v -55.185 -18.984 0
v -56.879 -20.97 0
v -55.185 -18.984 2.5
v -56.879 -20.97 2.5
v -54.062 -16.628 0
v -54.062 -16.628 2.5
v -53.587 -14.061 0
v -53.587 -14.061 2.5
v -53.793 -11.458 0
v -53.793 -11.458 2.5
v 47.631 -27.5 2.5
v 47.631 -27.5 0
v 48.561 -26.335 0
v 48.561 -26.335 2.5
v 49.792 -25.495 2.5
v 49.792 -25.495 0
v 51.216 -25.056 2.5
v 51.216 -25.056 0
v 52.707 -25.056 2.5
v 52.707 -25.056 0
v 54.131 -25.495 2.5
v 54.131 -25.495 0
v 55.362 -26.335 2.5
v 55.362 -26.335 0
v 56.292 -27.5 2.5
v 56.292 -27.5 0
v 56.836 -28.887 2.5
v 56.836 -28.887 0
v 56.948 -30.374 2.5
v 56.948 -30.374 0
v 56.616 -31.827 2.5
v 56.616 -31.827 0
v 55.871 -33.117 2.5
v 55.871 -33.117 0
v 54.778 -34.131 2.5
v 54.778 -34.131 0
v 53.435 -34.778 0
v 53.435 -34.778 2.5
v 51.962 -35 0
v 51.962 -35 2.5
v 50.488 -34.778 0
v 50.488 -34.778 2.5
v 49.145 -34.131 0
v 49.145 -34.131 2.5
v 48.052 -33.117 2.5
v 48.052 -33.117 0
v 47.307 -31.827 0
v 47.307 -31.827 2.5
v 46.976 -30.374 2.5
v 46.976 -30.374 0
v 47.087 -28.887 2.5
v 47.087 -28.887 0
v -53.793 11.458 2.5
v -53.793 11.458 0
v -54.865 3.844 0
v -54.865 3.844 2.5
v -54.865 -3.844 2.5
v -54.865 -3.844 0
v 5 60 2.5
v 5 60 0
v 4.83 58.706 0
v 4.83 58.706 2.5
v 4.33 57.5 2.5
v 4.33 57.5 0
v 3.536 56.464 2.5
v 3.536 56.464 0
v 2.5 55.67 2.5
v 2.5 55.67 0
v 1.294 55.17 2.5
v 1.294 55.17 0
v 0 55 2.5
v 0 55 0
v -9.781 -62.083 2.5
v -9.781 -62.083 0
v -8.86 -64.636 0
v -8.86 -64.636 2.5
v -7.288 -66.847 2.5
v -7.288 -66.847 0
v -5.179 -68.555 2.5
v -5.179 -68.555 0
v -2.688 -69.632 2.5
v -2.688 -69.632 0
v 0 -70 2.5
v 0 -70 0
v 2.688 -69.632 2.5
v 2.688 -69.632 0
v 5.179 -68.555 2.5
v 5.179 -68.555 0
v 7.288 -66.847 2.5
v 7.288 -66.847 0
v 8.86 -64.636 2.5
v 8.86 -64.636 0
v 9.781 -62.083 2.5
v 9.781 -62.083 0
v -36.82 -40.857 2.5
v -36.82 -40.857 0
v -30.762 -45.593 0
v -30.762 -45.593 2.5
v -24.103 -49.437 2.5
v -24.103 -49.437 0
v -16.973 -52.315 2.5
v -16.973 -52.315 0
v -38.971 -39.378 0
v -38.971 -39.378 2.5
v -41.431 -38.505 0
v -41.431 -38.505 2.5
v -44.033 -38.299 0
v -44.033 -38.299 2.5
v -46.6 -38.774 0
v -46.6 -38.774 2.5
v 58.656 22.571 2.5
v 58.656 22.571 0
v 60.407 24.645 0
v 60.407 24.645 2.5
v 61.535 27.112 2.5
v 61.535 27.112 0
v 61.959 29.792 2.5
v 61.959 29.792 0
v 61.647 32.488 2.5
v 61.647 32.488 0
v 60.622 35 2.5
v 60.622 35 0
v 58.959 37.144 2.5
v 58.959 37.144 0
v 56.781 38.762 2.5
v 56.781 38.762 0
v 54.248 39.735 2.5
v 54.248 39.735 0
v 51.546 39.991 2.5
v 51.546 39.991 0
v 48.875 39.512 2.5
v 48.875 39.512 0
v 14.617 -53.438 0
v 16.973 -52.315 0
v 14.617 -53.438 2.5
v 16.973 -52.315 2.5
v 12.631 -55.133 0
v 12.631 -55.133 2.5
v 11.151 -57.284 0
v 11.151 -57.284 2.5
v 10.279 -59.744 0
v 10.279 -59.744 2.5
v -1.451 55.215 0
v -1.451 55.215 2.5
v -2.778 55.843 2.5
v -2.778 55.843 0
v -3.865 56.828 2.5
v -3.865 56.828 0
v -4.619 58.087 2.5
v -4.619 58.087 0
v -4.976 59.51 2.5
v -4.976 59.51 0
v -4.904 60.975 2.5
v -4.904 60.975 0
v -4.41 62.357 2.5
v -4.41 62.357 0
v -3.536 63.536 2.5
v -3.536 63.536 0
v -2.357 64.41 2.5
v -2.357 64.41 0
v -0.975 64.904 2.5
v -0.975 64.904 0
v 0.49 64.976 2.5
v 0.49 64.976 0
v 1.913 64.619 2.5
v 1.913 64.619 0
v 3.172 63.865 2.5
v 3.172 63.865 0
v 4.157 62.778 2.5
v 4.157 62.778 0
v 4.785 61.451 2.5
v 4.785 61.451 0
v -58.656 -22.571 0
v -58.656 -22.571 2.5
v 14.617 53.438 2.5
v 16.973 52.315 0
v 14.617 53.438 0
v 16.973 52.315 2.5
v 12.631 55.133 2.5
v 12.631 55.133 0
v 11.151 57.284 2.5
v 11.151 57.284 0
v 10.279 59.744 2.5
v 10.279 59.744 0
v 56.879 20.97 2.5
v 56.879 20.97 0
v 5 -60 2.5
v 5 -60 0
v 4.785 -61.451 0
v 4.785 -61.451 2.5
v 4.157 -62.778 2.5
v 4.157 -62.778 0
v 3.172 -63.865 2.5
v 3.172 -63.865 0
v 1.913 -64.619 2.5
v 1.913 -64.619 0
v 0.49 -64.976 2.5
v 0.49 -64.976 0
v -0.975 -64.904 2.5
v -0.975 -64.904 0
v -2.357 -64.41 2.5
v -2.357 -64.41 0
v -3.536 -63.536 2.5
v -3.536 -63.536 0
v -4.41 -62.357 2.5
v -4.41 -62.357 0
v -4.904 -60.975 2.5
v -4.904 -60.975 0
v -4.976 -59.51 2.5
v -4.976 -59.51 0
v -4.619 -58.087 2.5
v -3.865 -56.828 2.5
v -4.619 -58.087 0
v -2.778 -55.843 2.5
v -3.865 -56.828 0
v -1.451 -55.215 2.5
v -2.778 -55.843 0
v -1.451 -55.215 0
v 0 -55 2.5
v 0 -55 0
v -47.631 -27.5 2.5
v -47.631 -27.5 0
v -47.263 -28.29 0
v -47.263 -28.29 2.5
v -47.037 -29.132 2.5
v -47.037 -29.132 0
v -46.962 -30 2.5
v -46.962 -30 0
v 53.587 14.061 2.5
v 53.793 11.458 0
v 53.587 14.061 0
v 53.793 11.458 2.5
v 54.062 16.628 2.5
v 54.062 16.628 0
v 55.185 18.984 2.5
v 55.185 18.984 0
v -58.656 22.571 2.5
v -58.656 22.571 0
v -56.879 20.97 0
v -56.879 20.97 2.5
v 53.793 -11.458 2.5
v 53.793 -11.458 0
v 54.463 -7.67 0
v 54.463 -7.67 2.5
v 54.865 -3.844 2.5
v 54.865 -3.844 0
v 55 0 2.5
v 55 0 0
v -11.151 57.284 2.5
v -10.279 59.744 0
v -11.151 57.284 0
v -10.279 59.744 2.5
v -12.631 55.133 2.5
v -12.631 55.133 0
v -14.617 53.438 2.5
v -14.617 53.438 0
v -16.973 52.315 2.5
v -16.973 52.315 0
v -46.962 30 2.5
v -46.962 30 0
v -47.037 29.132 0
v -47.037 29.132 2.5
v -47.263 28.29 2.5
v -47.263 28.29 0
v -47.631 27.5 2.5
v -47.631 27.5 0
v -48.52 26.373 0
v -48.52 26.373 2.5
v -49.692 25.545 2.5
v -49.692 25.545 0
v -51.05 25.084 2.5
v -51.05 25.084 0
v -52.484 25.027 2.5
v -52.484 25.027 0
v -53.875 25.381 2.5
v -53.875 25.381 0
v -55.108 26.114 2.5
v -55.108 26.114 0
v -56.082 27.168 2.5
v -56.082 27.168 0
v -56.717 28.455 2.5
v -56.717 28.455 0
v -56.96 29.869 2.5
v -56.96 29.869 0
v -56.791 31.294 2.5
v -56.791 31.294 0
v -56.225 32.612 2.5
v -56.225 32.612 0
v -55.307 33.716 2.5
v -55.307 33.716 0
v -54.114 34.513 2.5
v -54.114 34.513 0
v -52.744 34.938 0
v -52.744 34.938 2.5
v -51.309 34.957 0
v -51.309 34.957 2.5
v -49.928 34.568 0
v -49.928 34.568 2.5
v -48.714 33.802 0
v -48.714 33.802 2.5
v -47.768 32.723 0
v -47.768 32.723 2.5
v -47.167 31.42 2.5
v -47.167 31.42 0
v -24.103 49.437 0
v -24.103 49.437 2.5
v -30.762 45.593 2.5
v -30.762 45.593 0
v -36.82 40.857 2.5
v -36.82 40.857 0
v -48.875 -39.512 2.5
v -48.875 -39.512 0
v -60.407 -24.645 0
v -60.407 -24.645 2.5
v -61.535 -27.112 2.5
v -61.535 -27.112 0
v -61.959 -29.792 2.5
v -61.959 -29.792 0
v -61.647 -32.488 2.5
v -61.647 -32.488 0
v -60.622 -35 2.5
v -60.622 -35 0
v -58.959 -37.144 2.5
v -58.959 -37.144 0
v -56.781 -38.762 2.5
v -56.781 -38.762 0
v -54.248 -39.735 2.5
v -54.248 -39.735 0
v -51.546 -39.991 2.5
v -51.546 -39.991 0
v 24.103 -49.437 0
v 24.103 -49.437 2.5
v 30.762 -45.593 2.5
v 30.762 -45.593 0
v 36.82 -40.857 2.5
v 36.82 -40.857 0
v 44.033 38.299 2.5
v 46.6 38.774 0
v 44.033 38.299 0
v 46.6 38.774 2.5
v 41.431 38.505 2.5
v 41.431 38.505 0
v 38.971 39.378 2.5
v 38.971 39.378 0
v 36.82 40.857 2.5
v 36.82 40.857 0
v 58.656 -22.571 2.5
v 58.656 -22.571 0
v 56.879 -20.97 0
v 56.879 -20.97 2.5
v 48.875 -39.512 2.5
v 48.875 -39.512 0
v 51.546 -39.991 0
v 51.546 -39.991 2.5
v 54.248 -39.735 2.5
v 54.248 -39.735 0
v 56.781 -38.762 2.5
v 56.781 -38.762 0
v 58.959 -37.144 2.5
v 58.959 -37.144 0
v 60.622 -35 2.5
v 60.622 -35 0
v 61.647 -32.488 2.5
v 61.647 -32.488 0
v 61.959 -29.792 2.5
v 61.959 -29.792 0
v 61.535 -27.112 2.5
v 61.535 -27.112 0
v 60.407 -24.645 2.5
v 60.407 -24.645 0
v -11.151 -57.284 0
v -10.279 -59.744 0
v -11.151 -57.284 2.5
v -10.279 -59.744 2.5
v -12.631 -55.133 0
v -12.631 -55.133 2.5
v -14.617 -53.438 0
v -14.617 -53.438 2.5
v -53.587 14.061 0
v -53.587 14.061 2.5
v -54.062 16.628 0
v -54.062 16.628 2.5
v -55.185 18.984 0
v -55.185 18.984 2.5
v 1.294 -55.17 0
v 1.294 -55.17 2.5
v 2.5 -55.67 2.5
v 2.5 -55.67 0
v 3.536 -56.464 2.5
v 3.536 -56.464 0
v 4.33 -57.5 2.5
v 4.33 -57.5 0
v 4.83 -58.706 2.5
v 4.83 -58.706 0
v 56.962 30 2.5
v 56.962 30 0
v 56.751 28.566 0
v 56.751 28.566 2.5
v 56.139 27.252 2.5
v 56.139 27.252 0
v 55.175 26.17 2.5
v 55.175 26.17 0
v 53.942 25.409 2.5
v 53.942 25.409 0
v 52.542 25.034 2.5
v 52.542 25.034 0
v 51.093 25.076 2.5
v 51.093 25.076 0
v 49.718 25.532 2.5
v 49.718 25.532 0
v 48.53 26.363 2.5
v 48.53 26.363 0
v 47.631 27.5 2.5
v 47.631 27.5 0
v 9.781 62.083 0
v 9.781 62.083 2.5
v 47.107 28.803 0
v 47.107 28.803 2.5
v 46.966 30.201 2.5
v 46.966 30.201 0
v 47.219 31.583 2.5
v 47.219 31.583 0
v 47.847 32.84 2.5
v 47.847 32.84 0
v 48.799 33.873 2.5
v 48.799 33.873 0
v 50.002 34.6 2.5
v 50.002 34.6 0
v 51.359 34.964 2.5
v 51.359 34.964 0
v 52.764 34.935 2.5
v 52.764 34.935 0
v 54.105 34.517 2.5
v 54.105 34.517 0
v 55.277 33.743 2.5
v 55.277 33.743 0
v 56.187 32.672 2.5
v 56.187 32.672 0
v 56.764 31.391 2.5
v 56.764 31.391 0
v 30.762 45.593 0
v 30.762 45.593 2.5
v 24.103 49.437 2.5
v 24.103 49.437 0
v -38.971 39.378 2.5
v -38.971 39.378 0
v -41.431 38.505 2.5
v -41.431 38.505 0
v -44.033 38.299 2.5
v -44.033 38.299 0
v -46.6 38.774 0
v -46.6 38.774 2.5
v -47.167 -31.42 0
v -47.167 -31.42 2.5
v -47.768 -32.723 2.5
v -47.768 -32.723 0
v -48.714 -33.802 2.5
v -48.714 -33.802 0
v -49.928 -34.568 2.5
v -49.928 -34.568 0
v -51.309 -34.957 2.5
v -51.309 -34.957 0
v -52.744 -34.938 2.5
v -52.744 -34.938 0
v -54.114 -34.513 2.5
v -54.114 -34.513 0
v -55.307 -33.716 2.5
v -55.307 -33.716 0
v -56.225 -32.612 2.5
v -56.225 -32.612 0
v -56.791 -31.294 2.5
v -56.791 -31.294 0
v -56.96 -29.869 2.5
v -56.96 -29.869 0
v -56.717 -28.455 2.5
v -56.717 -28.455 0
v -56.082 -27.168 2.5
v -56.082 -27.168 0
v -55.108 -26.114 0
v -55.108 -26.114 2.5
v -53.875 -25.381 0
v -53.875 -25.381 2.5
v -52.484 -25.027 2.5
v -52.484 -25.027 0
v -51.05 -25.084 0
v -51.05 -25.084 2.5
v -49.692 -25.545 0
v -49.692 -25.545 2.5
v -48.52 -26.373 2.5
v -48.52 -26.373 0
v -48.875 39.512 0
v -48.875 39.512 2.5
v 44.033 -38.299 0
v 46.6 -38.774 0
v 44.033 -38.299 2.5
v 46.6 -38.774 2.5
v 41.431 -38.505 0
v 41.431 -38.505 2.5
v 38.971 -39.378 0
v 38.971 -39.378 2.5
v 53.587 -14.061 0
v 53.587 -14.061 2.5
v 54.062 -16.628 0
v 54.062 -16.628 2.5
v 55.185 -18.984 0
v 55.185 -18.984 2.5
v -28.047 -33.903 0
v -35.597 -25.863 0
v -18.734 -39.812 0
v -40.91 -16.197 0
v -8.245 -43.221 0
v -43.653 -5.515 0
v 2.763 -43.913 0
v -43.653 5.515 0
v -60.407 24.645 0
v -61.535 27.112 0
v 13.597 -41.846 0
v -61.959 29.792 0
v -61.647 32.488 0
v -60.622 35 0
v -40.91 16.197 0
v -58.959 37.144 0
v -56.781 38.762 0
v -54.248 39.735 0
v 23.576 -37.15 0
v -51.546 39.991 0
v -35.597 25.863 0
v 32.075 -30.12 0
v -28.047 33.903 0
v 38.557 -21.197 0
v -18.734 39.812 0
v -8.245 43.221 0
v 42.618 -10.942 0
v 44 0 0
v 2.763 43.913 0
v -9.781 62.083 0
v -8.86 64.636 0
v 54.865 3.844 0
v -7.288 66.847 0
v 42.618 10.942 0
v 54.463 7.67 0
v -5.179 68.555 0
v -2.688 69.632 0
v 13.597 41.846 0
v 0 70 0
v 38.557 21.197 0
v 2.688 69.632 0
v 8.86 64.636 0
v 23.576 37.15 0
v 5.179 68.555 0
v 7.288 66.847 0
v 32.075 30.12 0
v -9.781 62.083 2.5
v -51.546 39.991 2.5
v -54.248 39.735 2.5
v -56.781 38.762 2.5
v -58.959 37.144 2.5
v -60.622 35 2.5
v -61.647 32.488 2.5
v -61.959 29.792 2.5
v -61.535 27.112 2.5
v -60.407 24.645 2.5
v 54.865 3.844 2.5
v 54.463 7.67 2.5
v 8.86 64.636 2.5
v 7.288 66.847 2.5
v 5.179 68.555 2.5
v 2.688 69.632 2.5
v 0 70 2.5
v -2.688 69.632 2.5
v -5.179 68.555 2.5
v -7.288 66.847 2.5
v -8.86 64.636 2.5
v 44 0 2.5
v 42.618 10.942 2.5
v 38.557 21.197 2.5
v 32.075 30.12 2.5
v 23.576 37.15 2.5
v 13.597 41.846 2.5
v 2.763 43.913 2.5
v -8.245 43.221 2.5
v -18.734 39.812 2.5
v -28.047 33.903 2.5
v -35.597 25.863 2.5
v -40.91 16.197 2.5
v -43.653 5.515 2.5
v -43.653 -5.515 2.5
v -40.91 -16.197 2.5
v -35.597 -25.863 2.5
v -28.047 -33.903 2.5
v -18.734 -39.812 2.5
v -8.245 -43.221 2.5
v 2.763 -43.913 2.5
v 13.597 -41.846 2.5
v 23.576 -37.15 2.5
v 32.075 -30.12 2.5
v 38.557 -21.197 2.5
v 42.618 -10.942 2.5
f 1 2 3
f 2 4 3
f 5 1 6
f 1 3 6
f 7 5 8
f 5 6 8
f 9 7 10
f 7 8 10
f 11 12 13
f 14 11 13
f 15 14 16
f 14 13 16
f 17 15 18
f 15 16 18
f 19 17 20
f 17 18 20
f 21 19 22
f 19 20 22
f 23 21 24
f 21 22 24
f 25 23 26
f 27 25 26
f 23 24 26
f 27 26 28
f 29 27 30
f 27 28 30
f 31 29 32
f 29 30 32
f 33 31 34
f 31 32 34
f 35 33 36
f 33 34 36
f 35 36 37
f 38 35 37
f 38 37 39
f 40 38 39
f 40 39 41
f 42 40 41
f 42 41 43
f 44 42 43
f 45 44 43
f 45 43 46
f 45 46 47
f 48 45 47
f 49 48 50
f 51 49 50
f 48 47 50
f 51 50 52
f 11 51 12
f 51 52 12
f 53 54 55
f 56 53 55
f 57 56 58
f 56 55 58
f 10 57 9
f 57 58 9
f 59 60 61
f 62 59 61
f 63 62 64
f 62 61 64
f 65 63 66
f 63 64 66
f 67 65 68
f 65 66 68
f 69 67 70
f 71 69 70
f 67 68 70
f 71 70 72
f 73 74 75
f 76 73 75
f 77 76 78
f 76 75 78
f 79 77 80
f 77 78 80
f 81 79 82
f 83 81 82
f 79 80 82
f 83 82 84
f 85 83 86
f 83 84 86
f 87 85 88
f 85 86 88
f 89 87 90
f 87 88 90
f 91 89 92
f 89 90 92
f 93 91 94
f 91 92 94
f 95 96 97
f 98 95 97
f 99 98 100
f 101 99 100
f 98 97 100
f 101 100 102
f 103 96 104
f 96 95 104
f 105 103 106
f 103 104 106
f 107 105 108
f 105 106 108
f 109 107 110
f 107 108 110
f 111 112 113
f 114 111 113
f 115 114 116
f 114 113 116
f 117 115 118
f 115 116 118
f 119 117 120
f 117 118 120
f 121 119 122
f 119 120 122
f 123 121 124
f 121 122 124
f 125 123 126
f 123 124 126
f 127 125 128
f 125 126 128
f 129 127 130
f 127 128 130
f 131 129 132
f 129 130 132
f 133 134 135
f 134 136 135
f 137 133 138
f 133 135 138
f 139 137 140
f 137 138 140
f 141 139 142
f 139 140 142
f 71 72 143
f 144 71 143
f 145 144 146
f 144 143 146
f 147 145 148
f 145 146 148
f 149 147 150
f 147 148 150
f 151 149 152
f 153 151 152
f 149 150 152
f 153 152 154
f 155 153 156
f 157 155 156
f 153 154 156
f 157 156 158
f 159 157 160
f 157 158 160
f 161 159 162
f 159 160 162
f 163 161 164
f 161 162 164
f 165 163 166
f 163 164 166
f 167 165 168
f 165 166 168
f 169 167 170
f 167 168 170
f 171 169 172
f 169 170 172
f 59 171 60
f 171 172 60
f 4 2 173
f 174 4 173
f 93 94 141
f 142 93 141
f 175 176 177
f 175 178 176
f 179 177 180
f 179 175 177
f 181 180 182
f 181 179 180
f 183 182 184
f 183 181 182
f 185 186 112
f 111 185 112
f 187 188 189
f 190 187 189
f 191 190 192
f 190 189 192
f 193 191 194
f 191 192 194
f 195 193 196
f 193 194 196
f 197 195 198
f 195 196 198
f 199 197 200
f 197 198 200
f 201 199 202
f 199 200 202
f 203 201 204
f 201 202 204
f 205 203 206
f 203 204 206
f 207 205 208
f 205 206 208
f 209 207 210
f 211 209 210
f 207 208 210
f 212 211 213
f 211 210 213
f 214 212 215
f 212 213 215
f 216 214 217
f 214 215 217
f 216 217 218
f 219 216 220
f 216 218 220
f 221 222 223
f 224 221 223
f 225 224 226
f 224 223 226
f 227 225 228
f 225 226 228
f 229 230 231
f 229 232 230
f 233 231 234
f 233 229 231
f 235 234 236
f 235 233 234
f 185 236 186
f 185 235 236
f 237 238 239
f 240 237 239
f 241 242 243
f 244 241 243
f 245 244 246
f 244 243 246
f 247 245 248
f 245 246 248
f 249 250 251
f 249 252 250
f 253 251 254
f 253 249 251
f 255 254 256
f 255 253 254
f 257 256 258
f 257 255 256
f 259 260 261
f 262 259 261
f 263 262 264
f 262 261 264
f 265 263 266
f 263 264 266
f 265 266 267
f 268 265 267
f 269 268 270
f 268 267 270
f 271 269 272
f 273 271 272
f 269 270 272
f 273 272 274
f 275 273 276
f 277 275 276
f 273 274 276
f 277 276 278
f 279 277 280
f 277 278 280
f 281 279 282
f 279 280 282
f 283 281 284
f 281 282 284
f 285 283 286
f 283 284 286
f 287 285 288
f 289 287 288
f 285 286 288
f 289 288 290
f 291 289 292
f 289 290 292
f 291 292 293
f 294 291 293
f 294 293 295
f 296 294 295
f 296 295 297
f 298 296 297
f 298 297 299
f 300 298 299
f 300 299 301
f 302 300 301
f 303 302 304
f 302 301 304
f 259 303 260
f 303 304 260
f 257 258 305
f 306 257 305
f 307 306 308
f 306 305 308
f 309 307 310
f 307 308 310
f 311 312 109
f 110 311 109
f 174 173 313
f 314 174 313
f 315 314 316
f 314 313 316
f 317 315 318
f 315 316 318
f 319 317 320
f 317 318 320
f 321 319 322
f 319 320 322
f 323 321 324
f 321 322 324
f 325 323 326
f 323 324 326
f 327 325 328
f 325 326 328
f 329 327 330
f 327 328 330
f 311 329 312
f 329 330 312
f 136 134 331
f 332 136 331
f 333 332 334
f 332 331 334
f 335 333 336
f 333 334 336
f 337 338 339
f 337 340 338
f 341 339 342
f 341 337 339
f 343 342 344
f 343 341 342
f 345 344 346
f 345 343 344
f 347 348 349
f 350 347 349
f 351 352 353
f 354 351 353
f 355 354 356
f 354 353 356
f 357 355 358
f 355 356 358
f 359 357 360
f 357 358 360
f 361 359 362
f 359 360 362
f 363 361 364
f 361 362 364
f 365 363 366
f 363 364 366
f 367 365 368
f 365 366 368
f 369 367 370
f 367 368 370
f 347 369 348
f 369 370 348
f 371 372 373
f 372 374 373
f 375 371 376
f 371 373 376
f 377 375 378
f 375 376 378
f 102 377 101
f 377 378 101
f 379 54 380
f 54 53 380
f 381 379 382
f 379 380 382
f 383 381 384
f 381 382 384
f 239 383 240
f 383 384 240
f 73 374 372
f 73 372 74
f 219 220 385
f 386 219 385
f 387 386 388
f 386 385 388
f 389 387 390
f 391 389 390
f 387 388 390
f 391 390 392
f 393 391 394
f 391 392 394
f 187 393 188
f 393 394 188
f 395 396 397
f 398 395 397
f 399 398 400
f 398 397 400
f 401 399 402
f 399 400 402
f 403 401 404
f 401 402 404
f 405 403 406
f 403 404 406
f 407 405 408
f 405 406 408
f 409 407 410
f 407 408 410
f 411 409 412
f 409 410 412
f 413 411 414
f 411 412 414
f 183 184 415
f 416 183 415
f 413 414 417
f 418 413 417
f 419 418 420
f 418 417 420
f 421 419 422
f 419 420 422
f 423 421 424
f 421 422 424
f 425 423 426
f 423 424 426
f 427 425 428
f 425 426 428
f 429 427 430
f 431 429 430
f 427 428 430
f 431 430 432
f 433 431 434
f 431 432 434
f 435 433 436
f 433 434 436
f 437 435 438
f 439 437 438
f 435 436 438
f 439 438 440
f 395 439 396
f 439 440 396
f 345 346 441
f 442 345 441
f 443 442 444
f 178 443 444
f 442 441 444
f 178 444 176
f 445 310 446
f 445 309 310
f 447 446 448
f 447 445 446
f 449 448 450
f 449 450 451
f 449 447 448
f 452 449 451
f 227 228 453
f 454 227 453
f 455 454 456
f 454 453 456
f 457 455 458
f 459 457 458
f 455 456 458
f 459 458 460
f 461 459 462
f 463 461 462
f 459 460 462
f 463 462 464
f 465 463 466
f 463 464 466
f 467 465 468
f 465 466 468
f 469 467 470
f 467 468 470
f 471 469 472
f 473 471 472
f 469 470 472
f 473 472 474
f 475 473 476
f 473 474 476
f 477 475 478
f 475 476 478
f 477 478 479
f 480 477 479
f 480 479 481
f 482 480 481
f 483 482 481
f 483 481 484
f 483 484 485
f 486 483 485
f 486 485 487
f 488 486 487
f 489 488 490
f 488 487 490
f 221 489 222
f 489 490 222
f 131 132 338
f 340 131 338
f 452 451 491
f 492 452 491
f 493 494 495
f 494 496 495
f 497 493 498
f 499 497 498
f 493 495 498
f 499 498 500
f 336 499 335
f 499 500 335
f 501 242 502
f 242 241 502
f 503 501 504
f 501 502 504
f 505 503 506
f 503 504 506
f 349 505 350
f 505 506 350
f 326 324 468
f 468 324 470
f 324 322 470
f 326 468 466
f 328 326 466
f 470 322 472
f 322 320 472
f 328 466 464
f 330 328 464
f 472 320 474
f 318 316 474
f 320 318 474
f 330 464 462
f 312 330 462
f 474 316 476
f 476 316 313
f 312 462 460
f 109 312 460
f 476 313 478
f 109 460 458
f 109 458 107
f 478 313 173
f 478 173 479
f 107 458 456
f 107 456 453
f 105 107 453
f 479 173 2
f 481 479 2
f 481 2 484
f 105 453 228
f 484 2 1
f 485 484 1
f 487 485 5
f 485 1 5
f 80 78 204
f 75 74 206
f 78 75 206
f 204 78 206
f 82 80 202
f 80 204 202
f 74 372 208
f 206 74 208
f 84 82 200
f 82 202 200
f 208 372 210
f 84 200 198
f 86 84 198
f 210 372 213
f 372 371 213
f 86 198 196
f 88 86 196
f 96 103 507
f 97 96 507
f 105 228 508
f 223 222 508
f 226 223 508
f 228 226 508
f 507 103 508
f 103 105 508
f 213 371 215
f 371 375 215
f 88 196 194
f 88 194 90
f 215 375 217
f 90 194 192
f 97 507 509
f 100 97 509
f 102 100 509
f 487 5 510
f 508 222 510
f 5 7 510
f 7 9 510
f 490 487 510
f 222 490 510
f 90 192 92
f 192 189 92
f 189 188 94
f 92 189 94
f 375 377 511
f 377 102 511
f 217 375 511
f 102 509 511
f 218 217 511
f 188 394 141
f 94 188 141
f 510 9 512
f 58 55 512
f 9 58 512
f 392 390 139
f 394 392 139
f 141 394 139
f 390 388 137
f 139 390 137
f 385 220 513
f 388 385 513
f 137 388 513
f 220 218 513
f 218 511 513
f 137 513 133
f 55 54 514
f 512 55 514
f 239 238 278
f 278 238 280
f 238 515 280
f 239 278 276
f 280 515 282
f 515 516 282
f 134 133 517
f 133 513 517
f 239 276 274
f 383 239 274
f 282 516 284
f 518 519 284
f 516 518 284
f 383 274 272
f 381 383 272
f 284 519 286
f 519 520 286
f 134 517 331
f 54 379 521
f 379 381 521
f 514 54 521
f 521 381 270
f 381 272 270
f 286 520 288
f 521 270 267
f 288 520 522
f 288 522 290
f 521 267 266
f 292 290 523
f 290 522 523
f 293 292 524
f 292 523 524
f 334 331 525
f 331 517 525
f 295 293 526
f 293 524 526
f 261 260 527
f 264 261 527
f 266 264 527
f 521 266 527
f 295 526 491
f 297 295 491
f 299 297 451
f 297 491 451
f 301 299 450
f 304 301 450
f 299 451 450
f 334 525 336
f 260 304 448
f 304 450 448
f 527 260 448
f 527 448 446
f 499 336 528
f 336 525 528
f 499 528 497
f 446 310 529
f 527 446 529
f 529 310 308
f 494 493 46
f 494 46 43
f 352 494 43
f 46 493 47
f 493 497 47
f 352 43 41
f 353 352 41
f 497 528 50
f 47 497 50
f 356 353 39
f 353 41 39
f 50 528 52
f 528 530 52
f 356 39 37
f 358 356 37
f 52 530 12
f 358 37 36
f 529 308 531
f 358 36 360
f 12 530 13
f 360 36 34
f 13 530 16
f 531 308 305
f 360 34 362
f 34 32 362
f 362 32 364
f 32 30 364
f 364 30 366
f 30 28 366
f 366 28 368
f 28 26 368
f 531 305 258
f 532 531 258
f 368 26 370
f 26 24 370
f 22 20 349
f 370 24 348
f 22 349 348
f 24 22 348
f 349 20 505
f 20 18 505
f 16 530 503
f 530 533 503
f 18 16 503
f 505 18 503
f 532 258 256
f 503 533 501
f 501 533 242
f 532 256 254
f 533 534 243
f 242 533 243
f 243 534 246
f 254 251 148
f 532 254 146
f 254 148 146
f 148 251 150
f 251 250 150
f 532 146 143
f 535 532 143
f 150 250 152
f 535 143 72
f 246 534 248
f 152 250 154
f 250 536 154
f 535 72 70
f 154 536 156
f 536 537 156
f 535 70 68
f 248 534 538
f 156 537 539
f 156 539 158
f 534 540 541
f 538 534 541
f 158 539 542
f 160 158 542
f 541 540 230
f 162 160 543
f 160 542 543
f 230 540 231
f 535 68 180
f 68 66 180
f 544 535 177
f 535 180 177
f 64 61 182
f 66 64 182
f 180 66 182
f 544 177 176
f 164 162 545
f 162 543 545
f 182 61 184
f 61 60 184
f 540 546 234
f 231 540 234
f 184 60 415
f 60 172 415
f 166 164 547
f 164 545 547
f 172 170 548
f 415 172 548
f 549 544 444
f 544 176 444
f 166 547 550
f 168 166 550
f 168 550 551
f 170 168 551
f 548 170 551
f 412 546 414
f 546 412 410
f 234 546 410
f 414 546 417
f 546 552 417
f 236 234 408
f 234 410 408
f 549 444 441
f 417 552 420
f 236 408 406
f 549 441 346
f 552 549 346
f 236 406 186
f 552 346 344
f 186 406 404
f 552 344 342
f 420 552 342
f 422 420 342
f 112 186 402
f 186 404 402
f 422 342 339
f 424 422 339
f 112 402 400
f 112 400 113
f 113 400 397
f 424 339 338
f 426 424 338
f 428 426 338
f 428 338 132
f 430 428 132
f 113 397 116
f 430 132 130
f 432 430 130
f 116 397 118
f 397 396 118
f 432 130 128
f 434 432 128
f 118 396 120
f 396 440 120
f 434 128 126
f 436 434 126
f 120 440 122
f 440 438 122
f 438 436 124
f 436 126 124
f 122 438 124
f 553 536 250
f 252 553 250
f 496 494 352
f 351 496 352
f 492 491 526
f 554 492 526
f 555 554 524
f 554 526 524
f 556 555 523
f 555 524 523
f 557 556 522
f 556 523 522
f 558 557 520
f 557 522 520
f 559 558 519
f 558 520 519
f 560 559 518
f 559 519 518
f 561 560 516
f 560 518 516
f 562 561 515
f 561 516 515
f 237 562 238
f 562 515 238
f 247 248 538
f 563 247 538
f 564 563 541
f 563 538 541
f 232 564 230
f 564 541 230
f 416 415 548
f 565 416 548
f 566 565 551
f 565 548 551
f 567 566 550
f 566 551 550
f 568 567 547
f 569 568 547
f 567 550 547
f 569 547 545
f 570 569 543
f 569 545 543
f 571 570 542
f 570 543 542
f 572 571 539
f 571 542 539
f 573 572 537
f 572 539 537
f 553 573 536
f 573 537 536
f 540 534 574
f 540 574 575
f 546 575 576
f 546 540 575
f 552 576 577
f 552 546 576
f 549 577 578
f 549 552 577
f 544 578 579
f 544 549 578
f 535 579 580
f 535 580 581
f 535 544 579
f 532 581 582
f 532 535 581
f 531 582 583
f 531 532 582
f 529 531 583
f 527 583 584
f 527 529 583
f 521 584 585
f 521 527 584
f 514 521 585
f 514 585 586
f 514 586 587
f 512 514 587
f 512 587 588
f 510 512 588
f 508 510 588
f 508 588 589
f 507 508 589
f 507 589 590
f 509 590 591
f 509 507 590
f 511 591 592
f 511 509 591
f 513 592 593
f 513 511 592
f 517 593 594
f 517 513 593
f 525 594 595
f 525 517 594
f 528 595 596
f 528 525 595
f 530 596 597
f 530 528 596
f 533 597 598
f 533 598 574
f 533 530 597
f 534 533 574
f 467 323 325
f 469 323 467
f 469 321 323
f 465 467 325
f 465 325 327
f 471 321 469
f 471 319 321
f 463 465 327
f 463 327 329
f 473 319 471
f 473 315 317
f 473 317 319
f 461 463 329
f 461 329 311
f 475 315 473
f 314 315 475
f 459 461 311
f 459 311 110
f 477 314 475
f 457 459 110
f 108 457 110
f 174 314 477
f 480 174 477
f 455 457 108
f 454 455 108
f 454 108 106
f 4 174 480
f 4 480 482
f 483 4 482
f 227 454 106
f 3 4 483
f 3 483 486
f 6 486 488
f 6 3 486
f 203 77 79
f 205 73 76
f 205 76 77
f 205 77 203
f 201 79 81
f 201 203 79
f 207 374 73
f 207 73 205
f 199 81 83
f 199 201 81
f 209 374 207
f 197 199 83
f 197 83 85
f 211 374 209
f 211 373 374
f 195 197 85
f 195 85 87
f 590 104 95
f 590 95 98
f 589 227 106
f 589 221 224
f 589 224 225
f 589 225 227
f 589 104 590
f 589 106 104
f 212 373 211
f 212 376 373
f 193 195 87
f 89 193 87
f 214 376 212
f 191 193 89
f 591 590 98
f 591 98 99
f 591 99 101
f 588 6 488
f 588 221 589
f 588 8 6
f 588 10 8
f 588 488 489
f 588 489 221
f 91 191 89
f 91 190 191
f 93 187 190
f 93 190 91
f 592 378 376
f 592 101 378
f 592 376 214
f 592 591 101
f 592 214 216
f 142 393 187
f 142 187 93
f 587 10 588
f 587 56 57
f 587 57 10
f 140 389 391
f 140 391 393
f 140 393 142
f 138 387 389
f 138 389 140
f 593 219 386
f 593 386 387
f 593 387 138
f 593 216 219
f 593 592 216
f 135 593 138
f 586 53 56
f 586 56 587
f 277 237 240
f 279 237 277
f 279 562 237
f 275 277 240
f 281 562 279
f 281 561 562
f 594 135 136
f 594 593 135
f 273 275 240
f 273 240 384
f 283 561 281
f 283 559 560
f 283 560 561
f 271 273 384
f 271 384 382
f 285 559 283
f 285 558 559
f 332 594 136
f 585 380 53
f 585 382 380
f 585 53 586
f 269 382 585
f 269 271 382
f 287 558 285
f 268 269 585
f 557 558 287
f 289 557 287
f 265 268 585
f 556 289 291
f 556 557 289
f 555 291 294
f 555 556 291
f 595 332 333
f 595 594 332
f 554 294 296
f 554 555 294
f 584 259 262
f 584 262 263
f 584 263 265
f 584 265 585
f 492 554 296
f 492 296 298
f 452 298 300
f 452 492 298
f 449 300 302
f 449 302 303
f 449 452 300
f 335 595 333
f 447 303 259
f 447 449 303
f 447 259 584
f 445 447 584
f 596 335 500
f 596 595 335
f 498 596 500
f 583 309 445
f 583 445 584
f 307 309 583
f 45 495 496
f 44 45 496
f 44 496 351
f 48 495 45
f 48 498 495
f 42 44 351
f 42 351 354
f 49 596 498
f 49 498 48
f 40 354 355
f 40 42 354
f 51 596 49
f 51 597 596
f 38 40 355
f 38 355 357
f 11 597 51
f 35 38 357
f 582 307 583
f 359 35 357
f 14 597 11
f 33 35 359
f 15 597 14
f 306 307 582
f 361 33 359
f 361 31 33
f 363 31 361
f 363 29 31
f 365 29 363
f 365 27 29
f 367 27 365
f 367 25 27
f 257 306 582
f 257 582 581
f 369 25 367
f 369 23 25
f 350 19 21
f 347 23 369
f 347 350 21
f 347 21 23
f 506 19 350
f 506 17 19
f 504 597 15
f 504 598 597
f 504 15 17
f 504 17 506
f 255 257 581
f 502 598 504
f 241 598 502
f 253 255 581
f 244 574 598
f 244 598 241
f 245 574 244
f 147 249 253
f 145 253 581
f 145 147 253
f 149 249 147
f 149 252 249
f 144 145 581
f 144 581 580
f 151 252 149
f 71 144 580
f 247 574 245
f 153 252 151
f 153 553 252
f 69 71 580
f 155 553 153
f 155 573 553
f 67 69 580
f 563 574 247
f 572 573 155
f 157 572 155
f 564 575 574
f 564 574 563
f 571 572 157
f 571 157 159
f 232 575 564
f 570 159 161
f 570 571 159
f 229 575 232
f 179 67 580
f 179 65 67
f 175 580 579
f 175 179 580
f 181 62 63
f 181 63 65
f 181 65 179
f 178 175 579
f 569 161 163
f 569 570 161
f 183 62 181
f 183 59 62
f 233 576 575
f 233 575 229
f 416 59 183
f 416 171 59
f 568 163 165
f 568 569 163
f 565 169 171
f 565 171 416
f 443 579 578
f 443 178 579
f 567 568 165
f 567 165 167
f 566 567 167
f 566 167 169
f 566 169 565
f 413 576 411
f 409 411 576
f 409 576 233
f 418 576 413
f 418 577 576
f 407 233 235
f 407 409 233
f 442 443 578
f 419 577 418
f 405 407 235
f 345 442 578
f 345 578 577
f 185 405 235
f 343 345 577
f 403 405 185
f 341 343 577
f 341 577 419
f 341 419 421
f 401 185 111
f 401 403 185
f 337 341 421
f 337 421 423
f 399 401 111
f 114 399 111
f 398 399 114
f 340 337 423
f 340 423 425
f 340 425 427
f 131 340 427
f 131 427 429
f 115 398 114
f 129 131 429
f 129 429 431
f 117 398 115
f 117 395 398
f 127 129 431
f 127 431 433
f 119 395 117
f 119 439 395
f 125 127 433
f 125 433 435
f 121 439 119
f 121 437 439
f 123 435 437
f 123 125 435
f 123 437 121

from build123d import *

# Parameters (mm, degrees)
F0_R     = 44
F1_DEPTH = 2.5
F2_R     = 10


# Not quite as in the source:
# - a feature names something its author has since deleted; it is built from what else it names


with BuildPart() as f1:
    # F0 (on Top) → F1 (new body)
    with BuildSketch(Plane.XY):
        with BuildLine():
            ThreePointArc((52.3444859472, -16.8835657052), (54.3320657029, -8.5455623836), (55, 0))
            ThreePointArc((55, 0), (54.3320657029, 8.5455623836), (52.3444859472, 16.8835657052))
            ThreePointArc((52.3444859472, 16.8835657052), (50.268991125, 22.3165528538), (47.6313971166, 27.5000001585))
            ThreePointArc((47.6313971166, 27.5000001585), (44.461197151, 32.3759470579), (40.7938397808, 36.8898717257))
            ThreePointArc((40.7938397808, 36.8898717257), (27.5, 47.6313972081), (11.5506461665, 53.7734374309))
            ThreePointArc((11.5506461665, 53.7734374309), (5.8077939557, 54.6924997542), (-3e-09, 55))
            ThreePointArc((-3e-09, 55), (-5.8077939587, 54.6924997539), (-11.5506461665, 53.7734374309))
            ThreePointArc((-11.5506461665, 53.7734374309), (-27.5, 47.6313972081), (-40.7938397808, 36.8898717257))
            ThreePointArc((-40.7938397808, 36.8898717257), (-44.4611971512, 32.3759470576), (-47.631397117, 27.5000001579))
            ThreePointArc((-47.631397117, 27.5000001579), (-50.2689911251, 22.3165528534), (-52.3444859472, 16.8835657052))
            ThreePointArc((-52.3444859472, 16.8835657052), (-55, 0), (-52.3444859472, -16.8835657052))
            ThreePointArc((-52.3444859472, -16.8835657052), (-50.2689910436, -22.3165530371), (-47.631396916, -27.500000506))
            ThreePointArc((-47.631396916, -27.500000506), (-44.4611970329, -32.3759472201), (-40.7938397808, -36.8898717257))
            ThreePointArc((-40.7938397808, -36.8898717257), (-27.5, -47.6313972081), (-11.5506461665, -53.7734374309))
            ThreePointArc((-11.5506461665, -53.7734374309), (-5.8077939898, -54.6924997506), (-6.55e-08, -55))
            ThreePointArc((-6.55e-08, -55), (5.8077939247, -54.6924997575), (11.5506461665, -53.7734374309))
            ThreePointArc((11.5506461665, -53.7734374309), (27.5, -47.6313972081), (40.7938397808, -36.8898717257))
            ThreePointArc((40.7938397808, -36.8898717257), (44.461197297, -32.3759468575), (47.6313973645, -27.4999997291))
            ThreePointArc((47.6313973645, -27.4999997291), (50.2689912256, -22.3165526272), (52.3444859472, -16.8835657052))
        make_face()
        Circle(F0_R, mode=Mode.SUBTRACT)
        with BuildLine():
            ThreePointArc((-3e-09, 55), (5.8077939557, 54.6924997542), (11.5506461665, 53.7734374309))
            Line((11.5506461665, 53.7734374309), (9.7805788286, 62.0833333333))
            ThreePointArc((9.7805788286, 62.0833333333), (0, 70), (-9.7805788286, 62.0833333333))
            Line((-9.7805788286, 62.0833333333), (-11.5506461665, 53.7734374309))
            ThreePointArc((-11.5506461665, 53.7734374309), (-5.8077939587, 54.6924997539), (-3e-09, 55))
        make_face()
        with BuildLine():
            ThreePointArc((5, 60), (3.5355339049, 56.464466093), (-3e-09, 55))
            ThreePointArc((-3e-09, 55), (-3.5355339049, 63.535533907), (5, 60))
        make_face(mode=Mode.SUBTRACT)
        with BuildLine():
            ThreePointArc((-47.631397117, 27.5000001579), (-44.4611971512, 32.3759470576), (-40.7938397808, 36.8898717257))
            Line((-40.7938397808, 36.8898717257), (-48.875454404, 39.5118963959))
            ThreePointArc((-48.875454404, 39.5118963959), (-60.6217782649, 35), (-58.6560332326, 22.5714369374))
            Line((-58.6560332326, 22.5714369374), (-52.3444859472, 16.8835657052))
            ThreePointArc((-52.3444859472, 16.8835657052), (-50.2689911251, 22.3165528534), (-47.631397117, 27.5000001579))
        make_face()
        with BuildLine():
            ThreePointArc((-46.9615242271, 30), (-47.131895072, 28.7059048625), (-47.631397117, 27.5000001579))
            ThreePointArc((-47.631397117, 27.5000001579), (-56.7911533821, 31.2940951375), (-46.9615242271, 30))
        make_face(mode=Mode.SUBTRACT)
        with BuildLine():
            Line((-48.875454404, -39.5118963959), (-40.7938397808, -36.8898717257))
            ThreePointArc((-40.7938397808, -36.8898717257), (-44.4611970329, -32.3759472201), (-47.631396916, -27.500000506))
            ThreePointArc((-47.631396916, -27.500000506), (-50.2689910436, -22.3165530371), (-52.3444859472, -16.8835657052))
            Line((-52.3444859472, -16.8835657052), (-58.6560332326, -22.5714369374))
            ThreePointArc((-58.6560332326, -22.5714369374), (-60.6217782649, -35), (-48.875454404, -39.5118963959))
        make_face()
        with BuildLine():
            ThreePointArc((-46.9615242271, -30), (-56.7911534341, -31.2940949433), (-47.631396916, -27.500000506))
            ThreePointArc((-47.631396916, -27.500000506), (-47.13189502, -28.7059050567), (-46.9615242271, -30))
        make_face(mode=Mode.SUBTRACT)
        with BuildLine():
            Line((9.7805788286, -62.0833333333), (11.5506461665, -53.7734374309))
            ThreePointArc((11.5506461665, -53.7734374309), (5.8077939247, -54.6924997575), (-6.55e-08, -55))
            ThreePointArc((-6.55e-08, -55), (-5.8077939898, -54.6924997506), (-11.5506461665, -53.7734374309))
            Line((-11.5506461665, -53.7734374309), (-9.7805788286, -62.0833333333))
            ThreePointArc((-9.7805788286, -62.0833333333), (0, -70), (9.7805788286, -62.0833333333))
        make_face()
        with BuildLine():
            ThreePointArc((5, -60), (-3.5355338828, -63.5355339291), (-6.55e-08, -55))
            ThreePointArc((-6.55e-08, -55), (3.5355338828, -56.4644660709), (5, -60))
        make_face(mode=Mode.SUBTRACT)
        with BuildLine():
            Line((58.6560332326, -22.5714369374), (52.3444859472, -16.8835657052))
            ThreePointArc((52.3444859472, -16.8835657052), (50.2689912256, -22.3165526272), (47.6313973645, -27.4999997291))
            ThreePointArc((47.6313973645, -27.4999997291), (44.461197297, -32.3759468575), (40.7938397808, -36.8898717257))
            Line((40.7938397808, -36.8898717257), (48.875454404, -39.5118963959))
            ThreePointArc((48.875454404, -39.5118963959), (60.6217782649, -35), (58.6560332326, -22.5714369374))
        make_face()
        with BuildLine():
            ThreePointArc((56.9615242271, -30), (50.6674288505, -34.829629091), (47.6313973645, -27.4999997291))
            ThreePointArc((47.6313973645, -27.4999997291), (53.2556196037, -25.170370909), (56.9615242271, -30))
        make_face(mode=Mode.SUBTRACT)
        with BuildLine():
            ThreePointArc((47.6313971166, 27.5000001585), (50.268991125, 22.3165528538), (52.3444859472, 16.8835657052))
            Line((52.3444859472, 16.8835657052), (58.6560332326, 22.5714369374))
            ThreePointArc((58.6560332326, 22.5714369374), (60.6217782649, 35), (48.875454404, 39.5118963959))
            Line((48.875454404, 39.5118963959), (40.7938397808, 36.8898717257))
            ThreePointArc((40.7938397808, 36.8898717257), (44.461197151, 32.3759470579), (47.6313971166, 27.5000001585))
        make_face()
        with BuildLine():
            ThreePointArc((56.9615242271, 30), (53.2556193642, 25.1703708449), (47.6313971166, 27.5000001585))
            ThreePointArc((47.6313971166, 27.5000001585), (50.66742909, 34.8296291551), (56.9615242271, 30))
        make_face(mode=Mode.SUBTRACT)
    extrude(amount=F1_DEPTH)

    # F2
    f2_edges = [f1.edges().sort_by_distance(p)[0] for p in [
        (52.344486, -16.883566, 1.25),
        (52.344486, 16.883566, 1.25),
        (40.79384, 36.889872, 1.25),
        (11.550646, 53.773437, 1.25),
        (-11.550646, 53.773437, 1.25),
        (-40.79384, 36.889872, 1.25),
        (-52.344486, 16.883566, 1.25),
        (-52.344486, -16.883566, 1.25),
        (-40.79384, -36.889872, 1.25),
        (-11.550646, -53.773437, 1.25),
        (11.550646, -53.773437, 1.25),
        (40.79384, -36.889872, 1.25),
    ]]
    fillet(f2_edges, radius=F2_R)


solid = f1.part
